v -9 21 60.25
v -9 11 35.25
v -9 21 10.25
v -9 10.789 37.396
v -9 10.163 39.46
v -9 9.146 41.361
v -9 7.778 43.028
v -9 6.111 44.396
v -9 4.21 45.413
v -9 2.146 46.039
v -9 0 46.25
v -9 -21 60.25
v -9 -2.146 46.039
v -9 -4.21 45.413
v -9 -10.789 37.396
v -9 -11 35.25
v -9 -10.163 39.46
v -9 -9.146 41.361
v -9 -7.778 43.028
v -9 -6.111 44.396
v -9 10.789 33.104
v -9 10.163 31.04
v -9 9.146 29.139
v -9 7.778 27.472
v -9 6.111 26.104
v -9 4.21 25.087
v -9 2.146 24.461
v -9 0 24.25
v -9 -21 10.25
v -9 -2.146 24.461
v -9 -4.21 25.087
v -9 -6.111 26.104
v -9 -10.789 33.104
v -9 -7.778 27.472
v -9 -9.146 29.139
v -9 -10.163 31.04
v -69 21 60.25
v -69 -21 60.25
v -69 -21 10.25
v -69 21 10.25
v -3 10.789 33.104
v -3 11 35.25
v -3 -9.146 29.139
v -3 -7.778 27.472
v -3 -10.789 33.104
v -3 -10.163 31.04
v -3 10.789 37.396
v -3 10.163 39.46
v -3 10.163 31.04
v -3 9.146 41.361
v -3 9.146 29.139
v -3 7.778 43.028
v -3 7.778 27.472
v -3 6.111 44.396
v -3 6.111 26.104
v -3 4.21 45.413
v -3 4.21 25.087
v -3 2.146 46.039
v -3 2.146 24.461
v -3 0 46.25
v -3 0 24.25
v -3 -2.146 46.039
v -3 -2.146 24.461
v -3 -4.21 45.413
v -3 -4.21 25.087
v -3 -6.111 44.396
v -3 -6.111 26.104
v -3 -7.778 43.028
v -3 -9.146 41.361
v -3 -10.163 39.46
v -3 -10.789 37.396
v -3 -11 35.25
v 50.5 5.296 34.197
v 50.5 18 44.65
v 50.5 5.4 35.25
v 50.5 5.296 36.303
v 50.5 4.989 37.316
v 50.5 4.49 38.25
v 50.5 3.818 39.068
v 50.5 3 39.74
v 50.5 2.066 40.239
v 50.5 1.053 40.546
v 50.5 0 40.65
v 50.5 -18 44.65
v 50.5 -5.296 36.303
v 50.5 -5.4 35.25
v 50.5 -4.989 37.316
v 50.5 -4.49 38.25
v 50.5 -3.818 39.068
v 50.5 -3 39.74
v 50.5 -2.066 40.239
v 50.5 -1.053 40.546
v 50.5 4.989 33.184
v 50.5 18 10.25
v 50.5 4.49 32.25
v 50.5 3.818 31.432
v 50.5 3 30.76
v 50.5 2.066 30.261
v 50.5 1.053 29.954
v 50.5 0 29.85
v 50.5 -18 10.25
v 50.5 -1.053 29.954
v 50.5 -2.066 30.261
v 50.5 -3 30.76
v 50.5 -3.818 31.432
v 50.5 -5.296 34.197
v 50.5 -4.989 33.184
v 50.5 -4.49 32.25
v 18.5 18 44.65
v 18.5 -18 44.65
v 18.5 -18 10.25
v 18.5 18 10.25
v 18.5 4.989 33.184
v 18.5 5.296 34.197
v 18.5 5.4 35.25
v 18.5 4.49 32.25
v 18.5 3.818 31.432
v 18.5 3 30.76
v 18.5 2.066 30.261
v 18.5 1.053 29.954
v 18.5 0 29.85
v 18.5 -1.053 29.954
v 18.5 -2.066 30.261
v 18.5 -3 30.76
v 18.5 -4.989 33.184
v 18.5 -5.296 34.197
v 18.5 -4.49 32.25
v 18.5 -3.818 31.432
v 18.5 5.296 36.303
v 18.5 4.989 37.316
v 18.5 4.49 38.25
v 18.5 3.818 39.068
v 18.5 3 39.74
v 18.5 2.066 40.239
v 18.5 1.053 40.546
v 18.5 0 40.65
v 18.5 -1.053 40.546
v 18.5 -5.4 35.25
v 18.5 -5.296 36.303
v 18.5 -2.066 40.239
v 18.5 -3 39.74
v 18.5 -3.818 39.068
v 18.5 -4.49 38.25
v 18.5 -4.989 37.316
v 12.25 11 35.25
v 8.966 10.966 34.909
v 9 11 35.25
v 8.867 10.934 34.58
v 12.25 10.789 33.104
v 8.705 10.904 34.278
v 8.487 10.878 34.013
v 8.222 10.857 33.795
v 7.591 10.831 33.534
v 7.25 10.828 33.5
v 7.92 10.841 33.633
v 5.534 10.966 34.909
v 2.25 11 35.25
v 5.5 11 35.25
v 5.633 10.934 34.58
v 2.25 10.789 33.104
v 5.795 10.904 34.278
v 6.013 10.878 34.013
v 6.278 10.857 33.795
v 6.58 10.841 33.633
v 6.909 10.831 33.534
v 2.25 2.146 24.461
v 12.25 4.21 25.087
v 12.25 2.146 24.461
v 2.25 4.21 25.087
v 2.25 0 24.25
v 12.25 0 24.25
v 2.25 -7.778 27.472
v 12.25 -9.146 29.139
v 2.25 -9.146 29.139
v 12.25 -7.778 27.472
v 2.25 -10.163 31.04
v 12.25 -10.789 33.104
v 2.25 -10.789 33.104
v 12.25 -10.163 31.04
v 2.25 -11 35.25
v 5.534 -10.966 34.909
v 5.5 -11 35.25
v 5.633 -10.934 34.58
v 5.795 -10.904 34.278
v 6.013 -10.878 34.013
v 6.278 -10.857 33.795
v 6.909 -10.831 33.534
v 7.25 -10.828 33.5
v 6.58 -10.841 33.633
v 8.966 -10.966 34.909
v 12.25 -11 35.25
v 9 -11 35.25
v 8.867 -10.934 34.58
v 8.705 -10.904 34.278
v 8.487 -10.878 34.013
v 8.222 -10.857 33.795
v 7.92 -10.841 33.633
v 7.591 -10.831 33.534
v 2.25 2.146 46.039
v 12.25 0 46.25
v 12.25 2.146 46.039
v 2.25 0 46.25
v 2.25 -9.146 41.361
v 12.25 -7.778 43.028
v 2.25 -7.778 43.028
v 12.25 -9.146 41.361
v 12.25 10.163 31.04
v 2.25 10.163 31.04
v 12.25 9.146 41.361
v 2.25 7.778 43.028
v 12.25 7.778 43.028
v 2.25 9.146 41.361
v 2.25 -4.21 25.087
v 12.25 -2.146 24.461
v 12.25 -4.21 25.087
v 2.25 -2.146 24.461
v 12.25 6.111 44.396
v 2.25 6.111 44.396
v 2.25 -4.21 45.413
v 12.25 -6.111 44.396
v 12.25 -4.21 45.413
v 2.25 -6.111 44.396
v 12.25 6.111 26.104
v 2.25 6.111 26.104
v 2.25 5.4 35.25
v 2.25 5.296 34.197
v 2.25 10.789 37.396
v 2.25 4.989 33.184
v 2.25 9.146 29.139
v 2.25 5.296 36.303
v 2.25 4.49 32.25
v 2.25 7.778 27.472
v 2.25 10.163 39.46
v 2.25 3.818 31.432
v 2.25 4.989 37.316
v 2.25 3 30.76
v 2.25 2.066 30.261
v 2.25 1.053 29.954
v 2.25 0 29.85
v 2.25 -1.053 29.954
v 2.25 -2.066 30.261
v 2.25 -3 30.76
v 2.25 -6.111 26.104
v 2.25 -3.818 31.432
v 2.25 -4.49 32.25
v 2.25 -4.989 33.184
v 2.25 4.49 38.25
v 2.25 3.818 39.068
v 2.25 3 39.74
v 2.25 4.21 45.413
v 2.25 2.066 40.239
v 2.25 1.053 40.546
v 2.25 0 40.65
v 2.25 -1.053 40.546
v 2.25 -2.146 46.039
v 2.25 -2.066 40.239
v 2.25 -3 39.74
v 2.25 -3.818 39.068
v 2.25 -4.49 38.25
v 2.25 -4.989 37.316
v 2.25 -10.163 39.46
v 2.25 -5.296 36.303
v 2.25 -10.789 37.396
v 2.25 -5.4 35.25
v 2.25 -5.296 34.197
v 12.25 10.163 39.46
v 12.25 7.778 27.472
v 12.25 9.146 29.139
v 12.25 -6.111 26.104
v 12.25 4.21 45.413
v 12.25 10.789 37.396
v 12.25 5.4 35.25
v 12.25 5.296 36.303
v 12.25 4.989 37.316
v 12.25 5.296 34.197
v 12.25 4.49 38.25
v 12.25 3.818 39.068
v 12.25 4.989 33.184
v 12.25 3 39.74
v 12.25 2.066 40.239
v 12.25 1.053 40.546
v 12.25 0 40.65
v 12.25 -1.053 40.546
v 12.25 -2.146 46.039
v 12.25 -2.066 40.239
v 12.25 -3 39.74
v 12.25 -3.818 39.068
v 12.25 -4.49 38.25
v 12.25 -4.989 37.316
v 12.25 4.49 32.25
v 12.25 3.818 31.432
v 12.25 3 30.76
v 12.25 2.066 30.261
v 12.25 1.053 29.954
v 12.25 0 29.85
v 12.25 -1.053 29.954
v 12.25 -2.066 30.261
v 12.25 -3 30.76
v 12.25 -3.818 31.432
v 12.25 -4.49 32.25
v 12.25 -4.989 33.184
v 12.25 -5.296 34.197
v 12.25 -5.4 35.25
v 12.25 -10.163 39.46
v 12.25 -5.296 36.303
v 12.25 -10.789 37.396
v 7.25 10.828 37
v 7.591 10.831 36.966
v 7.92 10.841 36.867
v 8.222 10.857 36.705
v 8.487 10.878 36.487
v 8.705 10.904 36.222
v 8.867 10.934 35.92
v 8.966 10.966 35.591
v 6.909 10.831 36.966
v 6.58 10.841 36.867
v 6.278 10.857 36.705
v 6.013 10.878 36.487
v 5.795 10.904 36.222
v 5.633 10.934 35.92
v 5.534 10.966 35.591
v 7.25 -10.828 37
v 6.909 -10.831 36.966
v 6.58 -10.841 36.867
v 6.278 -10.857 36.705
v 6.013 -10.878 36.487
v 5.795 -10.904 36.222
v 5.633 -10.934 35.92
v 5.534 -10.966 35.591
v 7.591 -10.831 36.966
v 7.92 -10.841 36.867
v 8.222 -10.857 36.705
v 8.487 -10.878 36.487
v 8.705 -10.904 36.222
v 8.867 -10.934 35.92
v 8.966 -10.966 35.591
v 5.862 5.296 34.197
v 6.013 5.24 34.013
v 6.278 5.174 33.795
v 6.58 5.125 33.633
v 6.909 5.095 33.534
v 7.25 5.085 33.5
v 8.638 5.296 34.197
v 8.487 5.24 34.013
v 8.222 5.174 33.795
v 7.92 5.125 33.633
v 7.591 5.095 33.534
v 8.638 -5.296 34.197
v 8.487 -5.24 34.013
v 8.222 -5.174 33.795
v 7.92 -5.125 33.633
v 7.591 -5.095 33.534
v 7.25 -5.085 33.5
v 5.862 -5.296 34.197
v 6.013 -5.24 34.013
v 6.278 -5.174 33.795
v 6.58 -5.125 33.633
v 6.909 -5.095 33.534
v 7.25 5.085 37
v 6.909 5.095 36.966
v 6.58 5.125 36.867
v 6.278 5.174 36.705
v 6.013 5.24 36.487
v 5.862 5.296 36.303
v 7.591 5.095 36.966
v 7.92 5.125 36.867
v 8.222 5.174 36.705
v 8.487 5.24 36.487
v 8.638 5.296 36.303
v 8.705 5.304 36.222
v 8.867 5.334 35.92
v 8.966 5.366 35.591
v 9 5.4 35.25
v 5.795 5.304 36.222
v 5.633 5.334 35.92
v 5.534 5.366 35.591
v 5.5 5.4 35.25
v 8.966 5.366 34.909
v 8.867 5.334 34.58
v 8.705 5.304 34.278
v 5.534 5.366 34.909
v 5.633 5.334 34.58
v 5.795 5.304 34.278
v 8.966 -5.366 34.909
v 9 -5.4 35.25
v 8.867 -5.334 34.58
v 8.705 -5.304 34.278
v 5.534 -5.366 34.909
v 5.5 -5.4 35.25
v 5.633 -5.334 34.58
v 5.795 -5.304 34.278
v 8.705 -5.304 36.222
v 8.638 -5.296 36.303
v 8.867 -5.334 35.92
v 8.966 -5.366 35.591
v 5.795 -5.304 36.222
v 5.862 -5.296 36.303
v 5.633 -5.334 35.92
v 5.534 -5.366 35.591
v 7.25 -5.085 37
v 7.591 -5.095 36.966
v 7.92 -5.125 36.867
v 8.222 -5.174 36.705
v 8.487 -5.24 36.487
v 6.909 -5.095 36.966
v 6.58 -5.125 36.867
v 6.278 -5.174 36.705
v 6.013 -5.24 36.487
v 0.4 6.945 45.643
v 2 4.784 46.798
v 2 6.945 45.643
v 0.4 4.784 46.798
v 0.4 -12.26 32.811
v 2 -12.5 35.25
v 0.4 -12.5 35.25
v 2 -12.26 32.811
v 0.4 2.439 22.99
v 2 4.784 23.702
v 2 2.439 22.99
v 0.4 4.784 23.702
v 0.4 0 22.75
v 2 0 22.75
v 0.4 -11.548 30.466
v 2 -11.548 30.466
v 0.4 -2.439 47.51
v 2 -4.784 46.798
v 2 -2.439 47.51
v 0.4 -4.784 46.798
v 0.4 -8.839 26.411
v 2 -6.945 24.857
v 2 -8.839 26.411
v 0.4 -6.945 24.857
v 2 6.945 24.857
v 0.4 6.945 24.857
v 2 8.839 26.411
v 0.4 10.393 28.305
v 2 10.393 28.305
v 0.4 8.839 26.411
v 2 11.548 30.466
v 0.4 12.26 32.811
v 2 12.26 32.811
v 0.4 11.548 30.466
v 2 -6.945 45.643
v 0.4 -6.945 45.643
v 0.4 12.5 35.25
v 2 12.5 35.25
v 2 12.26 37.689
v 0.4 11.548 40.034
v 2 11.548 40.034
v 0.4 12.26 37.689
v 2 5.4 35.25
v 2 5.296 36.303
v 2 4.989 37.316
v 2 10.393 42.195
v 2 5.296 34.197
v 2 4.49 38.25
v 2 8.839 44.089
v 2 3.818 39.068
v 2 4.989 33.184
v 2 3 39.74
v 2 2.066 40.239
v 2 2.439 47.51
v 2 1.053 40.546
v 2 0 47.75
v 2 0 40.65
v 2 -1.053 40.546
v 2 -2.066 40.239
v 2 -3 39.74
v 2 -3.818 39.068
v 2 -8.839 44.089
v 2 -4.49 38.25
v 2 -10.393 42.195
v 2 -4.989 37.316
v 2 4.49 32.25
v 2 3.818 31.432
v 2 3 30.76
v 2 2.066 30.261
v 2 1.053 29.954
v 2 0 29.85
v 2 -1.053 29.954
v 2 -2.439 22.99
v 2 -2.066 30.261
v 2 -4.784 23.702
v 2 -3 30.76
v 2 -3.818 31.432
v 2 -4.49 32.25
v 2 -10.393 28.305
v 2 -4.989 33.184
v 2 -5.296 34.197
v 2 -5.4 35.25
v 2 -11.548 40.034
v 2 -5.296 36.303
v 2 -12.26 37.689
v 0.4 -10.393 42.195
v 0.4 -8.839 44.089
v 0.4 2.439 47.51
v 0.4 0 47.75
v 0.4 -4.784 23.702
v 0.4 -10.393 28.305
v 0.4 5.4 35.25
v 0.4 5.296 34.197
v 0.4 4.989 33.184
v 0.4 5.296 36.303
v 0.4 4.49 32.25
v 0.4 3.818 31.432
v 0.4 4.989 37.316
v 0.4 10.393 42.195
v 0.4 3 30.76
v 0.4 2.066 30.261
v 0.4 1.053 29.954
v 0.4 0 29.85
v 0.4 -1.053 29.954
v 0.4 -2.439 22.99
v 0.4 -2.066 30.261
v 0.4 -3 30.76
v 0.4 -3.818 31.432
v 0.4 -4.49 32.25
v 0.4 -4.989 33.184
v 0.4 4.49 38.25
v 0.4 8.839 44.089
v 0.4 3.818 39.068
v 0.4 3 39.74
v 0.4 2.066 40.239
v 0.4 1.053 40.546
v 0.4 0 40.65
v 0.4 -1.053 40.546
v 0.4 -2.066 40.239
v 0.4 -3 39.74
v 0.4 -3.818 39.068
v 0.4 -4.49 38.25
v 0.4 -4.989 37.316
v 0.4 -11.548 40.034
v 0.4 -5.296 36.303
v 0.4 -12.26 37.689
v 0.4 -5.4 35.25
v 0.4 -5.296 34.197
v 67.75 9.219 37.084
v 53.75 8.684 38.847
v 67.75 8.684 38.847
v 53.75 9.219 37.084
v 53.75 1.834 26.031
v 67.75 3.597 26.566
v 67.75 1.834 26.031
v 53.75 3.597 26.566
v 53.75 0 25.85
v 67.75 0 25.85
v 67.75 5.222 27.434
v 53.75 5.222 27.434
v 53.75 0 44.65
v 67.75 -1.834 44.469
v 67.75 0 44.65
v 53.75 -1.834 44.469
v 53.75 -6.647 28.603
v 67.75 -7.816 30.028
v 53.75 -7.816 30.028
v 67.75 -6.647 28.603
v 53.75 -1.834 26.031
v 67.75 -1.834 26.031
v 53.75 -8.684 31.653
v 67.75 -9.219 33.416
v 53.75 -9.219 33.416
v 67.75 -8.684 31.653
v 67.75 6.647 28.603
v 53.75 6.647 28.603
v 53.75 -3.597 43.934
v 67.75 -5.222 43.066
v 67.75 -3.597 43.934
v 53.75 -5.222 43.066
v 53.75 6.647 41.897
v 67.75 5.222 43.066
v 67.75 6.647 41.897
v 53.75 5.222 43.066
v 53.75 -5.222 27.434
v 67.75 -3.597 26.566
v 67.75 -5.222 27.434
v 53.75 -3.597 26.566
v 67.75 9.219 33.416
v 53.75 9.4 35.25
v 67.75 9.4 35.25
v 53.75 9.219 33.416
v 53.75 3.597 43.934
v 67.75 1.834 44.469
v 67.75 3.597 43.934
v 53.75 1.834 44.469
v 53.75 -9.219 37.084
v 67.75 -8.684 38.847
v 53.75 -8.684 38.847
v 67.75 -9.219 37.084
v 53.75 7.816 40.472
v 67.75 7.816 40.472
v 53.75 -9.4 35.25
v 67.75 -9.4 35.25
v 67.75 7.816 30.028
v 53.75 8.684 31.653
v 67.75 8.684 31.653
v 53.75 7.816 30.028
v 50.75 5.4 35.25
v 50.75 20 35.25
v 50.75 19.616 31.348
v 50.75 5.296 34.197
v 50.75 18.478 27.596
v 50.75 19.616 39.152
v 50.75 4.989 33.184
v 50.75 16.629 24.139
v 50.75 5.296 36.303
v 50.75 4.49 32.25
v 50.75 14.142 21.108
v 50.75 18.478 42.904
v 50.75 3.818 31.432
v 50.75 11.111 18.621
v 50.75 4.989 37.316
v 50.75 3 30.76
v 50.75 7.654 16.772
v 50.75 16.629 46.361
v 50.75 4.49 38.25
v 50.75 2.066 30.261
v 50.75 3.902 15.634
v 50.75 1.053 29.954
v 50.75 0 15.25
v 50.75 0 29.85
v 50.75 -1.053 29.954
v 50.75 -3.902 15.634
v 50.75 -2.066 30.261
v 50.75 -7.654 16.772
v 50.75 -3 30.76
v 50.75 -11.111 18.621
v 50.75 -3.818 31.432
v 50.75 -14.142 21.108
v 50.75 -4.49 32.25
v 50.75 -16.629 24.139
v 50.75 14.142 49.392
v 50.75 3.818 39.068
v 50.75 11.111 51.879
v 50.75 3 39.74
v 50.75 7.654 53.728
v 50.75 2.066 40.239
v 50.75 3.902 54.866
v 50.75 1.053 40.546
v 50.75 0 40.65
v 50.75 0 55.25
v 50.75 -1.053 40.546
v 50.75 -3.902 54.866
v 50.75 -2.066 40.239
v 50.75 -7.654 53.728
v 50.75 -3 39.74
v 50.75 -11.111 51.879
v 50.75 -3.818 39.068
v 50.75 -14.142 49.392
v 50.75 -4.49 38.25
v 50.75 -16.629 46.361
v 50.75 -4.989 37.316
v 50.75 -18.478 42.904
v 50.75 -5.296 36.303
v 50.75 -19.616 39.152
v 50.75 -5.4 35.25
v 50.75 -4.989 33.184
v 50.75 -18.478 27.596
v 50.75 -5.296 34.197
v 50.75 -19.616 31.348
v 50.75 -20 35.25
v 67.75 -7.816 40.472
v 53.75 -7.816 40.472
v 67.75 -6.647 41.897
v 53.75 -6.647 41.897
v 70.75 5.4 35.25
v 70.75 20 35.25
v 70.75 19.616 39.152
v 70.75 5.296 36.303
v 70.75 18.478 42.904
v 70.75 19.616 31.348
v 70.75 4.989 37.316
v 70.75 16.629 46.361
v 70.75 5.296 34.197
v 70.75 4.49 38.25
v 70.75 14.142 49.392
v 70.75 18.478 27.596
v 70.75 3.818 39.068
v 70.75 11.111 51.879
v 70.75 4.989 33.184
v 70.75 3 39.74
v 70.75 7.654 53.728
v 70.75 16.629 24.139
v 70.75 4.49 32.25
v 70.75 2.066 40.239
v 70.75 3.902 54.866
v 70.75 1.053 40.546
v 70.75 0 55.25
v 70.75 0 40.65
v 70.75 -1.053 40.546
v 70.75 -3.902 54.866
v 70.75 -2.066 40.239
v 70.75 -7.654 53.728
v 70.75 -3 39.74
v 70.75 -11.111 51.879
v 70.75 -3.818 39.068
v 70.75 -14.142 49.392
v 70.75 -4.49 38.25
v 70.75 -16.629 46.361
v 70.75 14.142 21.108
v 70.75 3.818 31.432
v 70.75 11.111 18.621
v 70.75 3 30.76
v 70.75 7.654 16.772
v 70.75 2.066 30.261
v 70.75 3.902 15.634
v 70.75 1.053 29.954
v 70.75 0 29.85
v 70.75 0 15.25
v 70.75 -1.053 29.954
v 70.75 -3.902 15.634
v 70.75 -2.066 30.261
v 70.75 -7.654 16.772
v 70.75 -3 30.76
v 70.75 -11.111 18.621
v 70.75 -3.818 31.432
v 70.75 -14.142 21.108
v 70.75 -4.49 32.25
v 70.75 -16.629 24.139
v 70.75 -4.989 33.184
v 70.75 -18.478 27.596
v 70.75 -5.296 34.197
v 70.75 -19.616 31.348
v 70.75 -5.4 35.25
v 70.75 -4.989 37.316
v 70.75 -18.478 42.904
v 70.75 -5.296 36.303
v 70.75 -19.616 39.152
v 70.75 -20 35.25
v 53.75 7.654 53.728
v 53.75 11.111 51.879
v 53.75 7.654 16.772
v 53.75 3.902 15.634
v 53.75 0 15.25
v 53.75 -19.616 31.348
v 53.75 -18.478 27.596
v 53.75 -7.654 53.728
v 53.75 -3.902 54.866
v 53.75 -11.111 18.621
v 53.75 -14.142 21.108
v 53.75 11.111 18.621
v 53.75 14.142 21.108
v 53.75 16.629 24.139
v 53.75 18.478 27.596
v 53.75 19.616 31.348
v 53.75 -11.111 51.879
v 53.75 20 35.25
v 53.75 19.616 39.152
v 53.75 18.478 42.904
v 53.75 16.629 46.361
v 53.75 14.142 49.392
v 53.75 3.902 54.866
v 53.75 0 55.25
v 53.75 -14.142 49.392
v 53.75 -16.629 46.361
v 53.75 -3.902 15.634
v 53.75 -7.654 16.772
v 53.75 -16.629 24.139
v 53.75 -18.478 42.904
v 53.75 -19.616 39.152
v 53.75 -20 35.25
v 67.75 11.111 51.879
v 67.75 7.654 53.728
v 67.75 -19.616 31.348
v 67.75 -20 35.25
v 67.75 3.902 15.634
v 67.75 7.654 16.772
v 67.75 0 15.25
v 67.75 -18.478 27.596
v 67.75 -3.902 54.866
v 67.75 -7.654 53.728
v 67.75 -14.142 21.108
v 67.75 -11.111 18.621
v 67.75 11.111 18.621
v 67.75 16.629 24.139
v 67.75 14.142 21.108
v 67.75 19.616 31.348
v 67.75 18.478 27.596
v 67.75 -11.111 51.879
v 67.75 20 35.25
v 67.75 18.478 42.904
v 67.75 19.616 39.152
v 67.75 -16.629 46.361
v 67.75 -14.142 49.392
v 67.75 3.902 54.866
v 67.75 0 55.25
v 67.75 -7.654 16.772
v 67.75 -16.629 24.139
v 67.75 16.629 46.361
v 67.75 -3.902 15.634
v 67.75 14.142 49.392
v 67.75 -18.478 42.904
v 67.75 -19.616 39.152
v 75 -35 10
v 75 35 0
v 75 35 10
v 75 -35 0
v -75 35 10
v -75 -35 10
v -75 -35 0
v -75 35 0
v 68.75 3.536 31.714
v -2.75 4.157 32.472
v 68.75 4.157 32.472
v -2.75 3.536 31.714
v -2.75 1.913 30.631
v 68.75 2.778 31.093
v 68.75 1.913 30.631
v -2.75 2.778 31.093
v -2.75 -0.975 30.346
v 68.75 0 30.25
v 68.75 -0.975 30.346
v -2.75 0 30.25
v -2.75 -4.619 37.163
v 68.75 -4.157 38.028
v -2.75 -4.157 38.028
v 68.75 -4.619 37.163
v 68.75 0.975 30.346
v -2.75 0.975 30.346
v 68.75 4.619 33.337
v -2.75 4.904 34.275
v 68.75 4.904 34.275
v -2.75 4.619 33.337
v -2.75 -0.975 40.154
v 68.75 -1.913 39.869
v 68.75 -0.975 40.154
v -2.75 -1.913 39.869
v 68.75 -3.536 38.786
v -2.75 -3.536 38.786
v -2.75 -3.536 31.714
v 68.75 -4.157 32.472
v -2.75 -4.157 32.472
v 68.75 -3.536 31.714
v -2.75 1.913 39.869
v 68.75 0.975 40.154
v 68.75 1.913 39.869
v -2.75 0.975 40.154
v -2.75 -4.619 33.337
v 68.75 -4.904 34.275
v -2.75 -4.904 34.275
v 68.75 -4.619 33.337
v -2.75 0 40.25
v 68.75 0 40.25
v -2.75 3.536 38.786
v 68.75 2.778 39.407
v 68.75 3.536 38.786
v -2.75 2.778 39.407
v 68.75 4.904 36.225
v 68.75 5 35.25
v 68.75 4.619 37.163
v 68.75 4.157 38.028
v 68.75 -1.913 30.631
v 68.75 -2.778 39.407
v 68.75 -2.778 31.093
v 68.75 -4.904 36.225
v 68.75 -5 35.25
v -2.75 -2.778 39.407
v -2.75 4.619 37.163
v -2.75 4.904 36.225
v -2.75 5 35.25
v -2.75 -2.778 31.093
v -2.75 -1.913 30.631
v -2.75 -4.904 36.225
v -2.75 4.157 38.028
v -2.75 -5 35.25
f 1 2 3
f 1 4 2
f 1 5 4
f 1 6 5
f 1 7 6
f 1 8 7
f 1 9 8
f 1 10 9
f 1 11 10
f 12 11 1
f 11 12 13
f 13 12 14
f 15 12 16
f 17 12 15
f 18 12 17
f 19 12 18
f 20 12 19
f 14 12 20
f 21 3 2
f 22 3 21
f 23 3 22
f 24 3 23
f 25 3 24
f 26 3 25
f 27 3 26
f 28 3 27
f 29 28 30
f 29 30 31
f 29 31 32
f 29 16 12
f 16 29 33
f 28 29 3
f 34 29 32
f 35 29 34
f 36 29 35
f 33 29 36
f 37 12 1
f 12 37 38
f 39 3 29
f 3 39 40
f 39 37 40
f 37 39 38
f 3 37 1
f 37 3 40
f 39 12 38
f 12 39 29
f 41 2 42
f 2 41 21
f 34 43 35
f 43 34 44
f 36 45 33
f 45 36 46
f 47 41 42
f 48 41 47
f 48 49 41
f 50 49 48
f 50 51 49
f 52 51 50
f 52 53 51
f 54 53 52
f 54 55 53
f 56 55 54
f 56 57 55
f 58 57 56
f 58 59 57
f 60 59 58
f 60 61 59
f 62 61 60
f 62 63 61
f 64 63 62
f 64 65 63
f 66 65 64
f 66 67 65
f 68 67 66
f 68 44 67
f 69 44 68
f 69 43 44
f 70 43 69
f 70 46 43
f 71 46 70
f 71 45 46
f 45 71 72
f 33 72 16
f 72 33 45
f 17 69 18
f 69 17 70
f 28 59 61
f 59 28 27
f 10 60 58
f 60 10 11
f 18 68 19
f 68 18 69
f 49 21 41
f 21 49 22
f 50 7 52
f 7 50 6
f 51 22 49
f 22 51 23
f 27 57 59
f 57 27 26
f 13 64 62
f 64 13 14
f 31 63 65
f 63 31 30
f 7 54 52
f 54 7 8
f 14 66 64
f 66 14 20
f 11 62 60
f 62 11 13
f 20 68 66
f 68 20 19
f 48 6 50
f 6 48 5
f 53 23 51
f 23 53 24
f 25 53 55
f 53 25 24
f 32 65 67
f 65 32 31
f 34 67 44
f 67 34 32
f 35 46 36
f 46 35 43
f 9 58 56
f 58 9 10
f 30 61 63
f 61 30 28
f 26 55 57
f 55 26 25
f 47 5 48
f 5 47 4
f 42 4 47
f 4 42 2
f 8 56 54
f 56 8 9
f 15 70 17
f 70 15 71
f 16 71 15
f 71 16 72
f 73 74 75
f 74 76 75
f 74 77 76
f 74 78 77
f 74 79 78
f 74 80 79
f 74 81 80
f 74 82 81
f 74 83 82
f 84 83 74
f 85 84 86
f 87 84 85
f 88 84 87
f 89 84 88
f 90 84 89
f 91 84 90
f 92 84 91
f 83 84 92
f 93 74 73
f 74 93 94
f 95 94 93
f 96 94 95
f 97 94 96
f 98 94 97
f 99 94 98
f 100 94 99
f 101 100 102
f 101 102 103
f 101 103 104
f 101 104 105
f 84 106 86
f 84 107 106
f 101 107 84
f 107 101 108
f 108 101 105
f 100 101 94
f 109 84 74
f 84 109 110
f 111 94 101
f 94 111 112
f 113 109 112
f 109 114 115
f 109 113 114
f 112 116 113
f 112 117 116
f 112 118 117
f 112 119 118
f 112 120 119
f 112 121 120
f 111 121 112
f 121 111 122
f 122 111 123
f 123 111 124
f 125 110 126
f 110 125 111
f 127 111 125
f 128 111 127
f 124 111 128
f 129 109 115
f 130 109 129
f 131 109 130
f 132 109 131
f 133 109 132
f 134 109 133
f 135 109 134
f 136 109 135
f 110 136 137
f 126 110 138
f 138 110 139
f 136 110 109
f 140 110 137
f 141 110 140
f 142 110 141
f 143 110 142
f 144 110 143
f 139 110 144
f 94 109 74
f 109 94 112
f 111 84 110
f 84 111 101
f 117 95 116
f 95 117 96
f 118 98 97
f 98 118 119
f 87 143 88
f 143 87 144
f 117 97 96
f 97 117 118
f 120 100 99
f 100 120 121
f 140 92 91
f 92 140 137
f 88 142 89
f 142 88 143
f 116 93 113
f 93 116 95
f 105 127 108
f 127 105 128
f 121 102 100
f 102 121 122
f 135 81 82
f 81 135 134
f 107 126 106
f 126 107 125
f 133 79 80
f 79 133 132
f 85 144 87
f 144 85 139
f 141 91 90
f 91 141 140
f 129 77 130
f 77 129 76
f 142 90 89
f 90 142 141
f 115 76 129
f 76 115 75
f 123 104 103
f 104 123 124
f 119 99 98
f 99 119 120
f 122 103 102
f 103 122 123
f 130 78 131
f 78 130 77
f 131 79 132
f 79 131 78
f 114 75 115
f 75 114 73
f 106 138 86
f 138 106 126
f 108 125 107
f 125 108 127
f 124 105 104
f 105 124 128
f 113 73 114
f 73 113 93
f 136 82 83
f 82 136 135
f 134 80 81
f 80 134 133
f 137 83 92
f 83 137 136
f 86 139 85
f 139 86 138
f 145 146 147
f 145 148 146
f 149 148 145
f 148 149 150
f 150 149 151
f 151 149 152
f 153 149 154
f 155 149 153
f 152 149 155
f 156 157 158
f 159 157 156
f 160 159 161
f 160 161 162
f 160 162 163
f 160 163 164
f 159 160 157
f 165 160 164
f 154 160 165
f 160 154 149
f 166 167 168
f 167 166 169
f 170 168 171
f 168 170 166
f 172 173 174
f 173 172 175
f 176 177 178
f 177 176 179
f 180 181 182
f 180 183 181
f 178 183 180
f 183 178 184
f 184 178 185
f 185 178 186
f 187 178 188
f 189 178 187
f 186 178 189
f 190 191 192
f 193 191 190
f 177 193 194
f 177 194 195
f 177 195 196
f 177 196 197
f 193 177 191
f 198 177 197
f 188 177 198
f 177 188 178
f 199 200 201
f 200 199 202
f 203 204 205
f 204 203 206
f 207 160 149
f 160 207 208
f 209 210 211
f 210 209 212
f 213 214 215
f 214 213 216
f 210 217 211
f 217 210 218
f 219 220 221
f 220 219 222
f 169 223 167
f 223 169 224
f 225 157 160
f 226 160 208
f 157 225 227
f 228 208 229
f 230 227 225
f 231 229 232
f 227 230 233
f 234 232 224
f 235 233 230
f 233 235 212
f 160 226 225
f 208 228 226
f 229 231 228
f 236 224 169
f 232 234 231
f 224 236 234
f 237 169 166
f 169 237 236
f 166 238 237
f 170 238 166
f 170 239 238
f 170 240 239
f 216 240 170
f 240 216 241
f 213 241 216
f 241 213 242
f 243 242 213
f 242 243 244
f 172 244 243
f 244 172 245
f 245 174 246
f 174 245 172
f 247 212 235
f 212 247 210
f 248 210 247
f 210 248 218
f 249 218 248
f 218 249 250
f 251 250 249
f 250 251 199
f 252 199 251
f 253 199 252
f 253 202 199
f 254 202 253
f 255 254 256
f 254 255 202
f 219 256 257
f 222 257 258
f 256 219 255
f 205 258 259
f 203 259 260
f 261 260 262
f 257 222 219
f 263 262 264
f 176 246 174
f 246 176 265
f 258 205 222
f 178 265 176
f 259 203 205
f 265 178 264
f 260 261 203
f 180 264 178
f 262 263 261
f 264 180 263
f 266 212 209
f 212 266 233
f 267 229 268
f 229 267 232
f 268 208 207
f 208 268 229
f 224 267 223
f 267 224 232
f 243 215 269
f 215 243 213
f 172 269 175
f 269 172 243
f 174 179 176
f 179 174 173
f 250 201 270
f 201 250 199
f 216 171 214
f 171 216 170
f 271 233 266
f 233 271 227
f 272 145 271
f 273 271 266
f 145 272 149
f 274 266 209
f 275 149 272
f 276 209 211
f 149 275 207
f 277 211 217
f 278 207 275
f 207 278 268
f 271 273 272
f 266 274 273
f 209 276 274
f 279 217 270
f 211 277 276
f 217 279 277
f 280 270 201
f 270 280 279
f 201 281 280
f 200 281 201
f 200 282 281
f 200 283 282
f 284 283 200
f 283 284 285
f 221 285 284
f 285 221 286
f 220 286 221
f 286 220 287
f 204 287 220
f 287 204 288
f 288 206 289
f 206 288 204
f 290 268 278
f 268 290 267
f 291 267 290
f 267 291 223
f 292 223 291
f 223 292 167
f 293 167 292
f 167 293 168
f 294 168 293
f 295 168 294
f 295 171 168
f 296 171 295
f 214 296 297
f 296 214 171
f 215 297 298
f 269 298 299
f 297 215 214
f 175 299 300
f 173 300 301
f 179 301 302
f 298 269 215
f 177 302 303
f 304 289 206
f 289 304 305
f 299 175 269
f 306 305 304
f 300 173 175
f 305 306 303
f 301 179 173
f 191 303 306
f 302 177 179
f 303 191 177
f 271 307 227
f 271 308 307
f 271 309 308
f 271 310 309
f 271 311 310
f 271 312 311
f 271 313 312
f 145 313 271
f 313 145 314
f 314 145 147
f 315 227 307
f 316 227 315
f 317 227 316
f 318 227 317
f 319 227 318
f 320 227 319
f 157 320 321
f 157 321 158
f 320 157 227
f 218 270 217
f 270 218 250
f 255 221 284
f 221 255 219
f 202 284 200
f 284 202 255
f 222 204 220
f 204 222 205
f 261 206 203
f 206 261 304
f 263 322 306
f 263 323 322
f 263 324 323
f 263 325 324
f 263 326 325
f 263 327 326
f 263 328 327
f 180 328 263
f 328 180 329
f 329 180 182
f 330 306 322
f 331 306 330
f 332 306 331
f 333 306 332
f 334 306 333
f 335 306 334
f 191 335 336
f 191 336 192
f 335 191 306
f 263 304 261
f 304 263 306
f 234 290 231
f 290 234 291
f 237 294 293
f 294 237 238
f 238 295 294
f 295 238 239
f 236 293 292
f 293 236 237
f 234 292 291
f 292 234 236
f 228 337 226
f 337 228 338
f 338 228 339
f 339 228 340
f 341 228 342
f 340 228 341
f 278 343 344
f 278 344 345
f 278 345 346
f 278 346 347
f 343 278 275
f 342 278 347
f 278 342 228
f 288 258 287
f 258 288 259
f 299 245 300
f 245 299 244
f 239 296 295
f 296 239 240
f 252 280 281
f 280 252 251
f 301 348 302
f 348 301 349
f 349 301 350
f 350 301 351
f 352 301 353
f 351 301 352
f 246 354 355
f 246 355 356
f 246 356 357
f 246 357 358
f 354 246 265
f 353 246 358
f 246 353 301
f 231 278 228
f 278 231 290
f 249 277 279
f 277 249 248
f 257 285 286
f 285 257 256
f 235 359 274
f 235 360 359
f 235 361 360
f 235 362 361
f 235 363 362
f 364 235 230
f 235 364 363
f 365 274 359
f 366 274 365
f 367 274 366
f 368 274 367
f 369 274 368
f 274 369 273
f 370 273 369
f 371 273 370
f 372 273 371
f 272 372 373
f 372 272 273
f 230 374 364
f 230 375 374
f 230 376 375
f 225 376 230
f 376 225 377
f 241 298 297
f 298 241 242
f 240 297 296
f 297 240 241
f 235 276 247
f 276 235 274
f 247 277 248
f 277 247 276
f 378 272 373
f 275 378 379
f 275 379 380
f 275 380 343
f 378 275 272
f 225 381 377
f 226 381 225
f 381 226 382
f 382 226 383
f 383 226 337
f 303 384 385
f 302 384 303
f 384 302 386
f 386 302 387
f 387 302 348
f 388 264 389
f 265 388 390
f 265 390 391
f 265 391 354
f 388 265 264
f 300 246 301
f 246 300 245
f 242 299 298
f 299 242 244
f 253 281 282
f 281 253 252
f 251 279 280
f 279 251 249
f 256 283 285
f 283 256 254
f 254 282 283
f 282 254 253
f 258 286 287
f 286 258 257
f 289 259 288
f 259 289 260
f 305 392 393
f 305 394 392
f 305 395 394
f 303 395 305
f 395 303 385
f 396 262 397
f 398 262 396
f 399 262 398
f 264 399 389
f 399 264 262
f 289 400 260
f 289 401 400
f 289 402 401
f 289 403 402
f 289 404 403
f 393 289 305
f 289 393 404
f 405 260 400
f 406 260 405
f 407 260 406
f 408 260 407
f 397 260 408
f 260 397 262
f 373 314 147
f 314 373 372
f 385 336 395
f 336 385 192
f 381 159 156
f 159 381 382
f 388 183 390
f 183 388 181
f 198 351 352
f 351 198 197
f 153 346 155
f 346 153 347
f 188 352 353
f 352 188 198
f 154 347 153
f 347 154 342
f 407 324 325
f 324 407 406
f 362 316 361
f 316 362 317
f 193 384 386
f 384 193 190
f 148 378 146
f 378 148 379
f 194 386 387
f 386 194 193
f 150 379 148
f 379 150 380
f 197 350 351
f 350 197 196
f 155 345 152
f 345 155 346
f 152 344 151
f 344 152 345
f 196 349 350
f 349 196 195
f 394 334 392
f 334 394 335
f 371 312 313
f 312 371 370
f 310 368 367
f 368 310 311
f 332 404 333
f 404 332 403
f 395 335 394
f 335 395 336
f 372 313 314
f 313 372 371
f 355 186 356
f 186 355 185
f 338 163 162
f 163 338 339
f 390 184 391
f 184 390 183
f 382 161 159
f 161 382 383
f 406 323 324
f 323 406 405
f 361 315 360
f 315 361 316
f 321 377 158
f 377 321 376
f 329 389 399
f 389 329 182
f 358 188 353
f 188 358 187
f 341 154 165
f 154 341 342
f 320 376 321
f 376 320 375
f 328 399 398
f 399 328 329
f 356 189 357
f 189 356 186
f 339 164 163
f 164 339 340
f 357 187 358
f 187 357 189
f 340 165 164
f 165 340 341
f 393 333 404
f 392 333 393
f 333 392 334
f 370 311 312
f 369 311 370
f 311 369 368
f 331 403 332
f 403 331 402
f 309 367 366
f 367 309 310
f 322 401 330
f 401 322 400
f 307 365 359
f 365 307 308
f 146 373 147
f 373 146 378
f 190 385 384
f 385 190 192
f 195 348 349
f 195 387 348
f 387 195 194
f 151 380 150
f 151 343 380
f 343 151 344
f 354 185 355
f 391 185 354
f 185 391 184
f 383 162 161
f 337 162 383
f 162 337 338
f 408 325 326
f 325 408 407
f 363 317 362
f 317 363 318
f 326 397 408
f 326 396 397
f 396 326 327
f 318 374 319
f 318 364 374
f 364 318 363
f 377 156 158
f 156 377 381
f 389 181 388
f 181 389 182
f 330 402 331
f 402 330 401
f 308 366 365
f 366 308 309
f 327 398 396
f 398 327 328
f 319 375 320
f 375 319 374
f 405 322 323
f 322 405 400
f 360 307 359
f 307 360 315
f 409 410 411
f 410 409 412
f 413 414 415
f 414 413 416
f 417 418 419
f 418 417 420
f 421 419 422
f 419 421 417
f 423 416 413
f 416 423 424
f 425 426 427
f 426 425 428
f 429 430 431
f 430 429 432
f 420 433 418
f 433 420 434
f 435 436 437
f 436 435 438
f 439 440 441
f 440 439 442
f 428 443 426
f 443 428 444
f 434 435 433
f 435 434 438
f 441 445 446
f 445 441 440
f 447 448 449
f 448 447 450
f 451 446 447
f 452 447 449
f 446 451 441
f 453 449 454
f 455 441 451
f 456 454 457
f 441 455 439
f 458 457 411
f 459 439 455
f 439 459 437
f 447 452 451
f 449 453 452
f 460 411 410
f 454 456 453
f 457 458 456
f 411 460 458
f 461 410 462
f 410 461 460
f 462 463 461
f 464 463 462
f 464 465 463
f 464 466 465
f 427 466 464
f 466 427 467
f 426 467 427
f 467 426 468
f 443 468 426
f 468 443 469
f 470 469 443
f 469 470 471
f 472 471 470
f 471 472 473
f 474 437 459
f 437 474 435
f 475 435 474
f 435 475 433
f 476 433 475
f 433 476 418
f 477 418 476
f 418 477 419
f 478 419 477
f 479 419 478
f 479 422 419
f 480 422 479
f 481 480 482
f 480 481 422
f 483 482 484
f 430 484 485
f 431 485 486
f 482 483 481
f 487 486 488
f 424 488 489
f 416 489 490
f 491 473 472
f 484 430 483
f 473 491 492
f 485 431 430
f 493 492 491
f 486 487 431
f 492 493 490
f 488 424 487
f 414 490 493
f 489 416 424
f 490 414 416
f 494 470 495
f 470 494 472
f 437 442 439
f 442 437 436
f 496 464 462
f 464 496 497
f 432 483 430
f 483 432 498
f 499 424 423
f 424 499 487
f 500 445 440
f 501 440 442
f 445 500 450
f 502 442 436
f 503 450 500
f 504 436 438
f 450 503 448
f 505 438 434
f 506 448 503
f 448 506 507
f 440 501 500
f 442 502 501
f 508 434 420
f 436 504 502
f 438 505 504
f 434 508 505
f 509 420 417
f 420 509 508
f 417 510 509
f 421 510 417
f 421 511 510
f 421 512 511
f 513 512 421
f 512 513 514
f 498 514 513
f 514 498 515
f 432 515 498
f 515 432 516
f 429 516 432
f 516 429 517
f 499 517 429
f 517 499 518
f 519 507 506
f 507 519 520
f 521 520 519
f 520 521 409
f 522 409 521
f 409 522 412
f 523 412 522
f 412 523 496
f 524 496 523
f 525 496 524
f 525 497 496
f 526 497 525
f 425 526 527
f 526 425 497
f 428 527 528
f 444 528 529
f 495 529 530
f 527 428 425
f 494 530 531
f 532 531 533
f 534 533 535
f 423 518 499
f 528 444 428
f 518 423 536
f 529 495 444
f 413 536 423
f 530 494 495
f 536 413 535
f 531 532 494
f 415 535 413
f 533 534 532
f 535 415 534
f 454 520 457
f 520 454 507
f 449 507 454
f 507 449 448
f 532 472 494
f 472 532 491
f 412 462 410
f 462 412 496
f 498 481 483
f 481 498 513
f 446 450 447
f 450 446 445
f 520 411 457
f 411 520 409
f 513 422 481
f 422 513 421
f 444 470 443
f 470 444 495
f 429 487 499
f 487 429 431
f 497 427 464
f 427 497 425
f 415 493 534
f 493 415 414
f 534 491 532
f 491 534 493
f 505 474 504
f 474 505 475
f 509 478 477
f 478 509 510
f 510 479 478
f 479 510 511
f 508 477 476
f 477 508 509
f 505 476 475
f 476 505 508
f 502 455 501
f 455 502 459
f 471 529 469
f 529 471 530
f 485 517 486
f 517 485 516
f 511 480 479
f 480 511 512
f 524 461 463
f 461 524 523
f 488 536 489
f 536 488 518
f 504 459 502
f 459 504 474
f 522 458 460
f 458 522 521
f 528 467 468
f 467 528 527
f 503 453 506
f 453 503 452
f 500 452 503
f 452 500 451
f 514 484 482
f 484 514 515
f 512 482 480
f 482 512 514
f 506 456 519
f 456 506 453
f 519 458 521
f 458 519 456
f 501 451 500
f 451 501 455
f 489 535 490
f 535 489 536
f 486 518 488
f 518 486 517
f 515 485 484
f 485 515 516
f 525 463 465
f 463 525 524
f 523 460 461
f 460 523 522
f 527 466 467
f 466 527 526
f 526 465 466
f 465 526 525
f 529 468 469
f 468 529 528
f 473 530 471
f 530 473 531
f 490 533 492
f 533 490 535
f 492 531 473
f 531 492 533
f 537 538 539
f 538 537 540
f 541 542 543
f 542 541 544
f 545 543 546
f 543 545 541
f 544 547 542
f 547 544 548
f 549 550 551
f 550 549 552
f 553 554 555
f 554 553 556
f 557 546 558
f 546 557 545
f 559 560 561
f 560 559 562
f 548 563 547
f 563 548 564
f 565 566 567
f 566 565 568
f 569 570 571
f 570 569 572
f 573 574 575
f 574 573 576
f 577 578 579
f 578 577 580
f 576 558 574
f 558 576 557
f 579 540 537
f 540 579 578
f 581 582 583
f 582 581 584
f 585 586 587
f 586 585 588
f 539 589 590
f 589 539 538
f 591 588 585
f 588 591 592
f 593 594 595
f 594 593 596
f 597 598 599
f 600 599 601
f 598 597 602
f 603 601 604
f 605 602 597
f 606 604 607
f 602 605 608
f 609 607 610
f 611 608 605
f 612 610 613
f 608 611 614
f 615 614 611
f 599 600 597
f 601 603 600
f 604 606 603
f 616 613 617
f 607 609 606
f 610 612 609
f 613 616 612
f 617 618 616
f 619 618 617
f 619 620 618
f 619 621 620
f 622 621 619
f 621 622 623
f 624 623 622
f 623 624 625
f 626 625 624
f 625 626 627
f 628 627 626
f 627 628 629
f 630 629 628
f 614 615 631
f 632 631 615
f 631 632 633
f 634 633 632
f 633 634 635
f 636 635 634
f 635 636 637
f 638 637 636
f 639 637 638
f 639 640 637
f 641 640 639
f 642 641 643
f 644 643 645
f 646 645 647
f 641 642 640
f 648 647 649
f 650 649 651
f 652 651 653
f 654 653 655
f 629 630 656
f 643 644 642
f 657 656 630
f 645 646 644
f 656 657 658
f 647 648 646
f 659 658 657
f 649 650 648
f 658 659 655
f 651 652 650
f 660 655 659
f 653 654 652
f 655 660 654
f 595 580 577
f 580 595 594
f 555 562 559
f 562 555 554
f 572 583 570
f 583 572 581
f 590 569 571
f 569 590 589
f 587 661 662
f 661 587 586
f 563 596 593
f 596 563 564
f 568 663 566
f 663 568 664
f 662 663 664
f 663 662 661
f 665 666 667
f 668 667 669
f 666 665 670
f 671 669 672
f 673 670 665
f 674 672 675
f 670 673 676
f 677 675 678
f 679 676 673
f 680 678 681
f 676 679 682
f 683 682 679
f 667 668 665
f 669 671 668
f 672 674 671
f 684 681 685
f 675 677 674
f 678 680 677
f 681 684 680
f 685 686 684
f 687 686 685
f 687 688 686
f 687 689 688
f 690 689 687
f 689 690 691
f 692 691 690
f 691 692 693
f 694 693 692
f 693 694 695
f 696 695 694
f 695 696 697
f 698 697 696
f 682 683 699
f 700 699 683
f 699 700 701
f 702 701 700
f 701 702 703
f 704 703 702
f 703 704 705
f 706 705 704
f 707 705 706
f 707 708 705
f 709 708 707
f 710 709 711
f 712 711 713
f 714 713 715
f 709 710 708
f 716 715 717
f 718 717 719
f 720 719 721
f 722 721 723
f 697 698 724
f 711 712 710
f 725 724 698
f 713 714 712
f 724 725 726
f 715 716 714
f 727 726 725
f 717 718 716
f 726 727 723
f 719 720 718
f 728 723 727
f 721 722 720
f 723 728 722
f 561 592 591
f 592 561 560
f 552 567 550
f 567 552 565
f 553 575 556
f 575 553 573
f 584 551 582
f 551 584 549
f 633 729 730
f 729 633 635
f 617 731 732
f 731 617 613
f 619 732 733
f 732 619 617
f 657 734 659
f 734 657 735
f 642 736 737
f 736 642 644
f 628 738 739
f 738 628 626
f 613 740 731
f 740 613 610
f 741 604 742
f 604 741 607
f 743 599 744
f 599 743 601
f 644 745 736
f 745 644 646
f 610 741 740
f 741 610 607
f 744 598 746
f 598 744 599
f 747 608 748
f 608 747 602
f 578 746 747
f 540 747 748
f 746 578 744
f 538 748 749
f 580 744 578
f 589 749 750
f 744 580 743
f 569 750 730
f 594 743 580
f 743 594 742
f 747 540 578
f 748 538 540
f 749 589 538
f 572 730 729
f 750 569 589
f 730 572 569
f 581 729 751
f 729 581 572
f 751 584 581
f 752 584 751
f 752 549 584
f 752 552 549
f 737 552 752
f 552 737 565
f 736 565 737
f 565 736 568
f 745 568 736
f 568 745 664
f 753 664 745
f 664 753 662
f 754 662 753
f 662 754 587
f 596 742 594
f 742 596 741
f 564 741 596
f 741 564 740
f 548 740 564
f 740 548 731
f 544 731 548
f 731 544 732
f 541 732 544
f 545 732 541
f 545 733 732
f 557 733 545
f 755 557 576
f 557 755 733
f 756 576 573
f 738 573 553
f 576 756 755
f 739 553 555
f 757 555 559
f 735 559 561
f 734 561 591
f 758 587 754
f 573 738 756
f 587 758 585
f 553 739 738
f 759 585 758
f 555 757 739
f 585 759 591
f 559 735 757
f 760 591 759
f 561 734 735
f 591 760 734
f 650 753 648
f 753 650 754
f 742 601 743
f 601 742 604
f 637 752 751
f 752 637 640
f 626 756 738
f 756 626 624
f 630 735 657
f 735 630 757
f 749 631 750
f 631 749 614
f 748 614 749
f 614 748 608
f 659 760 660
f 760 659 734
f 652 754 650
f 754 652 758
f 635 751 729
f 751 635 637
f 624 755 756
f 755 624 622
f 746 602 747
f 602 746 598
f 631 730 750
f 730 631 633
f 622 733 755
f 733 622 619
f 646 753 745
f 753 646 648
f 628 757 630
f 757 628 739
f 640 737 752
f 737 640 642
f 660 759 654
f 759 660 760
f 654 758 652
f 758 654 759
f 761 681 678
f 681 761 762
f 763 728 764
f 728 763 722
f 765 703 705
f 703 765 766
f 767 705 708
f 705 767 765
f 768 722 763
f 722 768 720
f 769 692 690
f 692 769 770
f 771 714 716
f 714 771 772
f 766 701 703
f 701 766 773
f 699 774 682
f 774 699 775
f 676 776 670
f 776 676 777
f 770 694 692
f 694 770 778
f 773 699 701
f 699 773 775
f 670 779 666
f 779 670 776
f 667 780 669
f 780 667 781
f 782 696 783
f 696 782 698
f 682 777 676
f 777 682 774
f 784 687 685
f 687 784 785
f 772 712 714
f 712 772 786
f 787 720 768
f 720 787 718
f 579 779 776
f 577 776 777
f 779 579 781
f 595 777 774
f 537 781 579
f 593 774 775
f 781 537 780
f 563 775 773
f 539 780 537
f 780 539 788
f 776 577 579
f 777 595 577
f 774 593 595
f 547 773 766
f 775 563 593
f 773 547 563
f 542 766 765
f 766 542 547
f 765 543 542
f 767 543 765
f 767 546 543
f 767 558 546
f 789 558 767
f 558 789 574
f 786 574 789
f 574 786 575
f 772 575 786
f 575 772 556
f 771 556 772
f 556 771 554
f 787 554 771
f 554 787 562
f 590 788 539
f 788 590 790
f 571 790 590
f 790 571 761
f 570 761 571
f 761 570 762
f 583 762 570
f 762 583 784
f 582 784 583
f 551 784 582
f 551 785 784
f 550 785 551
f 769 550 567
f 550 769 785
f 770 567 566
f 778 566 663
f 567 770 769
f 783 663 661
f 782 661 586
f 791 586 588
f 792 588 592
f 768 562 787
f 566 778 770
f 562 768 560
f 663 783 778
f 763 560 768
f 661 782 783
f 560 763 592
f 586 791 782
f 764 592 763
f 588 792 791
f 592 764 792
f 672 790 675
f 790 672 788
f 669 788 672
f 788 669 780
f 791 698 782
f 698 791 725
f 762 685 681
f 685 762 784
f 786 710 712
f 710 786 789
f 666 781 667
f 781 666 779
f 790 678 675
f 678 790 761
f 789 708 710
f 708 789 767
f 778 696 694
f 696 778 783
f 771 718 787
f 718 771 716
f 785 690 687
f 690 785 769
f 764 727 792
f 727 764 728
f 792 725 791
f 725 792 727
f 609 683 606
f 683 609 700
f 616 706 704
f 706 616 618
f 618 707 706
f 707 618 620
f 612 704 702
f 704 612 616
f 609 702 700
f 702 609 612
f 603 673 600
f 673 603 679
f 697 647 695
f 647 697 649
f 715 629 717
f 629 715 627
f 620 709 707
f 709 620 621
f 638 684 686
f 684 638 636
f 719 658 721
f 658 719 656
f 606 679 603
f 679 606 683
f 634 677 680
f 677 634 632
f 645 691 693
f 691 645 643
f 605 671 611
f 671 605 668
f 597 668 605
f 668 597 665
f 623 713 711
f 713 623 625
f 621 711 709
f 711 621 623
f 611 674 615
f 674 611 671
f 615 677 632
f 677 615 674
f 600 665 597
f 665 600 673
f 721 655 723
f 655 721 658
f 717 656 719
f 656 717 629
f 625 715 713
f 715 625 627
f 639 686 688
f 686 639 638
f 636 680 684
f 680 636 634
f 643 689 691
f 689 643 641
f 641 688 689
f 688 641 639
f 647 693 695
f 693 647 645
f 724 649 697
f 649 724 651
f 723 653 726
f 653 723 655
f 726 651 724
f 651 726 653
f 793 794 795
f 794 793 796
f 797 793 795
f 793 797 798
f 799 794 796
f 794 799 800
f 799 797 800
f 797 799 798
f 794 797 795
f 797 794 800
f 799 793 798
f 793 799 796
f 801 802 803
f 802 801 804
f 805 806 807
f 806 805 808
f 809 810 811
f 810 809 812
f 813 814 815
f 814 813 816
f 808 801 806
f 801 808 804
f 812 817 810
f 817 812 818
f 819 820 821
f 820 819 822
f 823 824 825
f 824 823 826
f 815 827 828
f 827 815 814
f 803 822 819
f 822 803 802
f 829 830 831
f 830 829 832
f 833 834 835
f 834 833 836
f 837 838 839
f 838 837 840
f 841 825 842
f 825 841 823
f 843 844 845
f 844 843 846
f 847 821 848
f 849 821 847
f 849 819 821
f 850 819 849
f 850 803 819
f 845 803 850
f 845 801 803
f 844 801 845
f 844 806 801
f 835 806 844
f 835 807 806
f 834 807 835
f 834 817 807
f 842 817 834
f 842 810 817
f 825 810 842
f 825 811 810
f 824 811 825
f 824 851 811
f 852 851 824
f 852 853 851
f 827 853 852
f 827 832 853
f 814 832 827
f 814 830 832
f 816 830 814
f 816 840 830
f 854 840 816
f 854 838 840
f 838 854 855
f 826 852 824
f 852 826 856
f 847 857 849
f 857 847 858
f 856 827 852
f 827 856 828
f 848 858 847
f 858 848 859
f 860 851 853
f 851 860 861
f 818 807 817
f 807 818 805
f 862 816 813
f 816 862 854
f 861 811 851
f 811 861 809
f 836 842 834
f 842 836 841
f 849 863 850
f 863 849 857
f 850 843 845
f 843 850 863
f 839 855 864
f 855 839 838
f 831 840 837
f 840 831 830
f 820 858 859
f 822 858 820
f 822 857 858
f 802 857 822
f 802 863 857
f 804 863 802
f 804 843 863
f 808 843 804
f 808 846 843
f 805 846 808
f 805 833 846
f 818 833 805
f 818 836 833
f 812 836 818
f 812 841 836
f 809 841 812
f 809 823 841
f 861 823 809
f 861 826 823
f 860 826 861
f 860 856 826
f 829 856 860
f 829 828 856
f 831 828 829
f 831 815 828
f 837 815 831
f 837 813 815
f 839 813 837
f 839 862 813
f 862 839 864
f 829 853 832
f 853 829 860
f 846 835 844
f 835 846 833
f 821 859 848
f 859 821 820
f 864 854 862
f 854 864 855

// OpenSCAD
$fn = 32;

// ------------------------------------------------------------------------
// Motor drive station: motor 60 x 50 mm, shaft d10, pulley d40
// Every part is its own module, assembly() places every instance.
// ------------------------------------------------------------------------

// --- part 1 ---
module station_bed() {
  difference() {
    translate([-75, -35, 0]) cube([150, 70, 10]);
  }
}

// --- part 2 ---
module drive_motor() {
  union() {
    translate([-30, -21, 0]) cube([60, 42, 50]);
    translate([33, 0, 25]) rotate([0, 90, 0]) cylinder(h = 6, d = 22, center = true);
  }
}

// --- part 3 ---
module pillow_block() {
  difference() {
    translate([-16, -18, 0]) cube([32, 36, 34.4]);
    translate([0, 0, 25]) rotate([0, 90, 0]) cylinder(h = 34, d = 10.8, center = true);
  }
}

// --- part 4 ---
module drive_shaft() {
  translate([0, 0, -35.75]) cylinder(h = 71.5, d = 10);
}

// --- part 5 ---
module shaft_collar() {
  difference() {
    cylinder(h = 10, d = 22);
    translate([0, 0, -1]) cylinder(h = 12, d = 10.8);
    translate([0, 0, 5]) rotate([90, 0, 0]) cylinder(h = 24, d = 3.5, center = true);
  }
}

// --- part 6 ---
module collar_washer() {
  difference() {
      translate([0, 0, 0]) cylinder(h = 1.6, d = 25);
      translate([0, 0, -1]) cylinder(h = 3.6, d = 10.8);
    }
}

// --- part 7 ---
module drive_pulley() {
  difference() {
    union() {
      cylinder(h = 20, d = 18.8);
      cylinder(h = 3, d = 40);
      translate([0, 0, 17]) cylinder(h = 3, d = 40);
    }
    translate([0, 0, -1]) cylinder(h = 22, d = 10.8);
  }
}

// --- assembly ---
module assembly() {
  color([0.80, 0.24, 0.20]) translate([0, 0, 0]) rotate([0, 0, 0]) station_bed();
  color([0.20, 0.45, 0.75]) translate([-39, 0, 10.25]) rotate([0, 0, 0]) drive_motor();
  color([0.25, 0.62, 0.32]) translate([34.5, 0, 10.25]) rotate([0, 0, 0]) pillow_block();
  color([0.92, 0.70, 0.18]) translate([33, 0, 35.25]) rotate([0, 90, 0]) drive_shaft();
  color([0.58, 0.35, 0.70]) translate([2.25, 0, 35.25]) rotate([0, 90, 0]) shaft_collar();
  color([0.16, 0.66, 0.66]) translate([0.4, 0, 35.25]) rotate([0, 90, 0]) collar_washer();
  color([0.85, 0.48, 0.18]) translate([50.75, 0, 35.25]) rotate([0, 90, 0]) drive_pulley();
}

assembly();
